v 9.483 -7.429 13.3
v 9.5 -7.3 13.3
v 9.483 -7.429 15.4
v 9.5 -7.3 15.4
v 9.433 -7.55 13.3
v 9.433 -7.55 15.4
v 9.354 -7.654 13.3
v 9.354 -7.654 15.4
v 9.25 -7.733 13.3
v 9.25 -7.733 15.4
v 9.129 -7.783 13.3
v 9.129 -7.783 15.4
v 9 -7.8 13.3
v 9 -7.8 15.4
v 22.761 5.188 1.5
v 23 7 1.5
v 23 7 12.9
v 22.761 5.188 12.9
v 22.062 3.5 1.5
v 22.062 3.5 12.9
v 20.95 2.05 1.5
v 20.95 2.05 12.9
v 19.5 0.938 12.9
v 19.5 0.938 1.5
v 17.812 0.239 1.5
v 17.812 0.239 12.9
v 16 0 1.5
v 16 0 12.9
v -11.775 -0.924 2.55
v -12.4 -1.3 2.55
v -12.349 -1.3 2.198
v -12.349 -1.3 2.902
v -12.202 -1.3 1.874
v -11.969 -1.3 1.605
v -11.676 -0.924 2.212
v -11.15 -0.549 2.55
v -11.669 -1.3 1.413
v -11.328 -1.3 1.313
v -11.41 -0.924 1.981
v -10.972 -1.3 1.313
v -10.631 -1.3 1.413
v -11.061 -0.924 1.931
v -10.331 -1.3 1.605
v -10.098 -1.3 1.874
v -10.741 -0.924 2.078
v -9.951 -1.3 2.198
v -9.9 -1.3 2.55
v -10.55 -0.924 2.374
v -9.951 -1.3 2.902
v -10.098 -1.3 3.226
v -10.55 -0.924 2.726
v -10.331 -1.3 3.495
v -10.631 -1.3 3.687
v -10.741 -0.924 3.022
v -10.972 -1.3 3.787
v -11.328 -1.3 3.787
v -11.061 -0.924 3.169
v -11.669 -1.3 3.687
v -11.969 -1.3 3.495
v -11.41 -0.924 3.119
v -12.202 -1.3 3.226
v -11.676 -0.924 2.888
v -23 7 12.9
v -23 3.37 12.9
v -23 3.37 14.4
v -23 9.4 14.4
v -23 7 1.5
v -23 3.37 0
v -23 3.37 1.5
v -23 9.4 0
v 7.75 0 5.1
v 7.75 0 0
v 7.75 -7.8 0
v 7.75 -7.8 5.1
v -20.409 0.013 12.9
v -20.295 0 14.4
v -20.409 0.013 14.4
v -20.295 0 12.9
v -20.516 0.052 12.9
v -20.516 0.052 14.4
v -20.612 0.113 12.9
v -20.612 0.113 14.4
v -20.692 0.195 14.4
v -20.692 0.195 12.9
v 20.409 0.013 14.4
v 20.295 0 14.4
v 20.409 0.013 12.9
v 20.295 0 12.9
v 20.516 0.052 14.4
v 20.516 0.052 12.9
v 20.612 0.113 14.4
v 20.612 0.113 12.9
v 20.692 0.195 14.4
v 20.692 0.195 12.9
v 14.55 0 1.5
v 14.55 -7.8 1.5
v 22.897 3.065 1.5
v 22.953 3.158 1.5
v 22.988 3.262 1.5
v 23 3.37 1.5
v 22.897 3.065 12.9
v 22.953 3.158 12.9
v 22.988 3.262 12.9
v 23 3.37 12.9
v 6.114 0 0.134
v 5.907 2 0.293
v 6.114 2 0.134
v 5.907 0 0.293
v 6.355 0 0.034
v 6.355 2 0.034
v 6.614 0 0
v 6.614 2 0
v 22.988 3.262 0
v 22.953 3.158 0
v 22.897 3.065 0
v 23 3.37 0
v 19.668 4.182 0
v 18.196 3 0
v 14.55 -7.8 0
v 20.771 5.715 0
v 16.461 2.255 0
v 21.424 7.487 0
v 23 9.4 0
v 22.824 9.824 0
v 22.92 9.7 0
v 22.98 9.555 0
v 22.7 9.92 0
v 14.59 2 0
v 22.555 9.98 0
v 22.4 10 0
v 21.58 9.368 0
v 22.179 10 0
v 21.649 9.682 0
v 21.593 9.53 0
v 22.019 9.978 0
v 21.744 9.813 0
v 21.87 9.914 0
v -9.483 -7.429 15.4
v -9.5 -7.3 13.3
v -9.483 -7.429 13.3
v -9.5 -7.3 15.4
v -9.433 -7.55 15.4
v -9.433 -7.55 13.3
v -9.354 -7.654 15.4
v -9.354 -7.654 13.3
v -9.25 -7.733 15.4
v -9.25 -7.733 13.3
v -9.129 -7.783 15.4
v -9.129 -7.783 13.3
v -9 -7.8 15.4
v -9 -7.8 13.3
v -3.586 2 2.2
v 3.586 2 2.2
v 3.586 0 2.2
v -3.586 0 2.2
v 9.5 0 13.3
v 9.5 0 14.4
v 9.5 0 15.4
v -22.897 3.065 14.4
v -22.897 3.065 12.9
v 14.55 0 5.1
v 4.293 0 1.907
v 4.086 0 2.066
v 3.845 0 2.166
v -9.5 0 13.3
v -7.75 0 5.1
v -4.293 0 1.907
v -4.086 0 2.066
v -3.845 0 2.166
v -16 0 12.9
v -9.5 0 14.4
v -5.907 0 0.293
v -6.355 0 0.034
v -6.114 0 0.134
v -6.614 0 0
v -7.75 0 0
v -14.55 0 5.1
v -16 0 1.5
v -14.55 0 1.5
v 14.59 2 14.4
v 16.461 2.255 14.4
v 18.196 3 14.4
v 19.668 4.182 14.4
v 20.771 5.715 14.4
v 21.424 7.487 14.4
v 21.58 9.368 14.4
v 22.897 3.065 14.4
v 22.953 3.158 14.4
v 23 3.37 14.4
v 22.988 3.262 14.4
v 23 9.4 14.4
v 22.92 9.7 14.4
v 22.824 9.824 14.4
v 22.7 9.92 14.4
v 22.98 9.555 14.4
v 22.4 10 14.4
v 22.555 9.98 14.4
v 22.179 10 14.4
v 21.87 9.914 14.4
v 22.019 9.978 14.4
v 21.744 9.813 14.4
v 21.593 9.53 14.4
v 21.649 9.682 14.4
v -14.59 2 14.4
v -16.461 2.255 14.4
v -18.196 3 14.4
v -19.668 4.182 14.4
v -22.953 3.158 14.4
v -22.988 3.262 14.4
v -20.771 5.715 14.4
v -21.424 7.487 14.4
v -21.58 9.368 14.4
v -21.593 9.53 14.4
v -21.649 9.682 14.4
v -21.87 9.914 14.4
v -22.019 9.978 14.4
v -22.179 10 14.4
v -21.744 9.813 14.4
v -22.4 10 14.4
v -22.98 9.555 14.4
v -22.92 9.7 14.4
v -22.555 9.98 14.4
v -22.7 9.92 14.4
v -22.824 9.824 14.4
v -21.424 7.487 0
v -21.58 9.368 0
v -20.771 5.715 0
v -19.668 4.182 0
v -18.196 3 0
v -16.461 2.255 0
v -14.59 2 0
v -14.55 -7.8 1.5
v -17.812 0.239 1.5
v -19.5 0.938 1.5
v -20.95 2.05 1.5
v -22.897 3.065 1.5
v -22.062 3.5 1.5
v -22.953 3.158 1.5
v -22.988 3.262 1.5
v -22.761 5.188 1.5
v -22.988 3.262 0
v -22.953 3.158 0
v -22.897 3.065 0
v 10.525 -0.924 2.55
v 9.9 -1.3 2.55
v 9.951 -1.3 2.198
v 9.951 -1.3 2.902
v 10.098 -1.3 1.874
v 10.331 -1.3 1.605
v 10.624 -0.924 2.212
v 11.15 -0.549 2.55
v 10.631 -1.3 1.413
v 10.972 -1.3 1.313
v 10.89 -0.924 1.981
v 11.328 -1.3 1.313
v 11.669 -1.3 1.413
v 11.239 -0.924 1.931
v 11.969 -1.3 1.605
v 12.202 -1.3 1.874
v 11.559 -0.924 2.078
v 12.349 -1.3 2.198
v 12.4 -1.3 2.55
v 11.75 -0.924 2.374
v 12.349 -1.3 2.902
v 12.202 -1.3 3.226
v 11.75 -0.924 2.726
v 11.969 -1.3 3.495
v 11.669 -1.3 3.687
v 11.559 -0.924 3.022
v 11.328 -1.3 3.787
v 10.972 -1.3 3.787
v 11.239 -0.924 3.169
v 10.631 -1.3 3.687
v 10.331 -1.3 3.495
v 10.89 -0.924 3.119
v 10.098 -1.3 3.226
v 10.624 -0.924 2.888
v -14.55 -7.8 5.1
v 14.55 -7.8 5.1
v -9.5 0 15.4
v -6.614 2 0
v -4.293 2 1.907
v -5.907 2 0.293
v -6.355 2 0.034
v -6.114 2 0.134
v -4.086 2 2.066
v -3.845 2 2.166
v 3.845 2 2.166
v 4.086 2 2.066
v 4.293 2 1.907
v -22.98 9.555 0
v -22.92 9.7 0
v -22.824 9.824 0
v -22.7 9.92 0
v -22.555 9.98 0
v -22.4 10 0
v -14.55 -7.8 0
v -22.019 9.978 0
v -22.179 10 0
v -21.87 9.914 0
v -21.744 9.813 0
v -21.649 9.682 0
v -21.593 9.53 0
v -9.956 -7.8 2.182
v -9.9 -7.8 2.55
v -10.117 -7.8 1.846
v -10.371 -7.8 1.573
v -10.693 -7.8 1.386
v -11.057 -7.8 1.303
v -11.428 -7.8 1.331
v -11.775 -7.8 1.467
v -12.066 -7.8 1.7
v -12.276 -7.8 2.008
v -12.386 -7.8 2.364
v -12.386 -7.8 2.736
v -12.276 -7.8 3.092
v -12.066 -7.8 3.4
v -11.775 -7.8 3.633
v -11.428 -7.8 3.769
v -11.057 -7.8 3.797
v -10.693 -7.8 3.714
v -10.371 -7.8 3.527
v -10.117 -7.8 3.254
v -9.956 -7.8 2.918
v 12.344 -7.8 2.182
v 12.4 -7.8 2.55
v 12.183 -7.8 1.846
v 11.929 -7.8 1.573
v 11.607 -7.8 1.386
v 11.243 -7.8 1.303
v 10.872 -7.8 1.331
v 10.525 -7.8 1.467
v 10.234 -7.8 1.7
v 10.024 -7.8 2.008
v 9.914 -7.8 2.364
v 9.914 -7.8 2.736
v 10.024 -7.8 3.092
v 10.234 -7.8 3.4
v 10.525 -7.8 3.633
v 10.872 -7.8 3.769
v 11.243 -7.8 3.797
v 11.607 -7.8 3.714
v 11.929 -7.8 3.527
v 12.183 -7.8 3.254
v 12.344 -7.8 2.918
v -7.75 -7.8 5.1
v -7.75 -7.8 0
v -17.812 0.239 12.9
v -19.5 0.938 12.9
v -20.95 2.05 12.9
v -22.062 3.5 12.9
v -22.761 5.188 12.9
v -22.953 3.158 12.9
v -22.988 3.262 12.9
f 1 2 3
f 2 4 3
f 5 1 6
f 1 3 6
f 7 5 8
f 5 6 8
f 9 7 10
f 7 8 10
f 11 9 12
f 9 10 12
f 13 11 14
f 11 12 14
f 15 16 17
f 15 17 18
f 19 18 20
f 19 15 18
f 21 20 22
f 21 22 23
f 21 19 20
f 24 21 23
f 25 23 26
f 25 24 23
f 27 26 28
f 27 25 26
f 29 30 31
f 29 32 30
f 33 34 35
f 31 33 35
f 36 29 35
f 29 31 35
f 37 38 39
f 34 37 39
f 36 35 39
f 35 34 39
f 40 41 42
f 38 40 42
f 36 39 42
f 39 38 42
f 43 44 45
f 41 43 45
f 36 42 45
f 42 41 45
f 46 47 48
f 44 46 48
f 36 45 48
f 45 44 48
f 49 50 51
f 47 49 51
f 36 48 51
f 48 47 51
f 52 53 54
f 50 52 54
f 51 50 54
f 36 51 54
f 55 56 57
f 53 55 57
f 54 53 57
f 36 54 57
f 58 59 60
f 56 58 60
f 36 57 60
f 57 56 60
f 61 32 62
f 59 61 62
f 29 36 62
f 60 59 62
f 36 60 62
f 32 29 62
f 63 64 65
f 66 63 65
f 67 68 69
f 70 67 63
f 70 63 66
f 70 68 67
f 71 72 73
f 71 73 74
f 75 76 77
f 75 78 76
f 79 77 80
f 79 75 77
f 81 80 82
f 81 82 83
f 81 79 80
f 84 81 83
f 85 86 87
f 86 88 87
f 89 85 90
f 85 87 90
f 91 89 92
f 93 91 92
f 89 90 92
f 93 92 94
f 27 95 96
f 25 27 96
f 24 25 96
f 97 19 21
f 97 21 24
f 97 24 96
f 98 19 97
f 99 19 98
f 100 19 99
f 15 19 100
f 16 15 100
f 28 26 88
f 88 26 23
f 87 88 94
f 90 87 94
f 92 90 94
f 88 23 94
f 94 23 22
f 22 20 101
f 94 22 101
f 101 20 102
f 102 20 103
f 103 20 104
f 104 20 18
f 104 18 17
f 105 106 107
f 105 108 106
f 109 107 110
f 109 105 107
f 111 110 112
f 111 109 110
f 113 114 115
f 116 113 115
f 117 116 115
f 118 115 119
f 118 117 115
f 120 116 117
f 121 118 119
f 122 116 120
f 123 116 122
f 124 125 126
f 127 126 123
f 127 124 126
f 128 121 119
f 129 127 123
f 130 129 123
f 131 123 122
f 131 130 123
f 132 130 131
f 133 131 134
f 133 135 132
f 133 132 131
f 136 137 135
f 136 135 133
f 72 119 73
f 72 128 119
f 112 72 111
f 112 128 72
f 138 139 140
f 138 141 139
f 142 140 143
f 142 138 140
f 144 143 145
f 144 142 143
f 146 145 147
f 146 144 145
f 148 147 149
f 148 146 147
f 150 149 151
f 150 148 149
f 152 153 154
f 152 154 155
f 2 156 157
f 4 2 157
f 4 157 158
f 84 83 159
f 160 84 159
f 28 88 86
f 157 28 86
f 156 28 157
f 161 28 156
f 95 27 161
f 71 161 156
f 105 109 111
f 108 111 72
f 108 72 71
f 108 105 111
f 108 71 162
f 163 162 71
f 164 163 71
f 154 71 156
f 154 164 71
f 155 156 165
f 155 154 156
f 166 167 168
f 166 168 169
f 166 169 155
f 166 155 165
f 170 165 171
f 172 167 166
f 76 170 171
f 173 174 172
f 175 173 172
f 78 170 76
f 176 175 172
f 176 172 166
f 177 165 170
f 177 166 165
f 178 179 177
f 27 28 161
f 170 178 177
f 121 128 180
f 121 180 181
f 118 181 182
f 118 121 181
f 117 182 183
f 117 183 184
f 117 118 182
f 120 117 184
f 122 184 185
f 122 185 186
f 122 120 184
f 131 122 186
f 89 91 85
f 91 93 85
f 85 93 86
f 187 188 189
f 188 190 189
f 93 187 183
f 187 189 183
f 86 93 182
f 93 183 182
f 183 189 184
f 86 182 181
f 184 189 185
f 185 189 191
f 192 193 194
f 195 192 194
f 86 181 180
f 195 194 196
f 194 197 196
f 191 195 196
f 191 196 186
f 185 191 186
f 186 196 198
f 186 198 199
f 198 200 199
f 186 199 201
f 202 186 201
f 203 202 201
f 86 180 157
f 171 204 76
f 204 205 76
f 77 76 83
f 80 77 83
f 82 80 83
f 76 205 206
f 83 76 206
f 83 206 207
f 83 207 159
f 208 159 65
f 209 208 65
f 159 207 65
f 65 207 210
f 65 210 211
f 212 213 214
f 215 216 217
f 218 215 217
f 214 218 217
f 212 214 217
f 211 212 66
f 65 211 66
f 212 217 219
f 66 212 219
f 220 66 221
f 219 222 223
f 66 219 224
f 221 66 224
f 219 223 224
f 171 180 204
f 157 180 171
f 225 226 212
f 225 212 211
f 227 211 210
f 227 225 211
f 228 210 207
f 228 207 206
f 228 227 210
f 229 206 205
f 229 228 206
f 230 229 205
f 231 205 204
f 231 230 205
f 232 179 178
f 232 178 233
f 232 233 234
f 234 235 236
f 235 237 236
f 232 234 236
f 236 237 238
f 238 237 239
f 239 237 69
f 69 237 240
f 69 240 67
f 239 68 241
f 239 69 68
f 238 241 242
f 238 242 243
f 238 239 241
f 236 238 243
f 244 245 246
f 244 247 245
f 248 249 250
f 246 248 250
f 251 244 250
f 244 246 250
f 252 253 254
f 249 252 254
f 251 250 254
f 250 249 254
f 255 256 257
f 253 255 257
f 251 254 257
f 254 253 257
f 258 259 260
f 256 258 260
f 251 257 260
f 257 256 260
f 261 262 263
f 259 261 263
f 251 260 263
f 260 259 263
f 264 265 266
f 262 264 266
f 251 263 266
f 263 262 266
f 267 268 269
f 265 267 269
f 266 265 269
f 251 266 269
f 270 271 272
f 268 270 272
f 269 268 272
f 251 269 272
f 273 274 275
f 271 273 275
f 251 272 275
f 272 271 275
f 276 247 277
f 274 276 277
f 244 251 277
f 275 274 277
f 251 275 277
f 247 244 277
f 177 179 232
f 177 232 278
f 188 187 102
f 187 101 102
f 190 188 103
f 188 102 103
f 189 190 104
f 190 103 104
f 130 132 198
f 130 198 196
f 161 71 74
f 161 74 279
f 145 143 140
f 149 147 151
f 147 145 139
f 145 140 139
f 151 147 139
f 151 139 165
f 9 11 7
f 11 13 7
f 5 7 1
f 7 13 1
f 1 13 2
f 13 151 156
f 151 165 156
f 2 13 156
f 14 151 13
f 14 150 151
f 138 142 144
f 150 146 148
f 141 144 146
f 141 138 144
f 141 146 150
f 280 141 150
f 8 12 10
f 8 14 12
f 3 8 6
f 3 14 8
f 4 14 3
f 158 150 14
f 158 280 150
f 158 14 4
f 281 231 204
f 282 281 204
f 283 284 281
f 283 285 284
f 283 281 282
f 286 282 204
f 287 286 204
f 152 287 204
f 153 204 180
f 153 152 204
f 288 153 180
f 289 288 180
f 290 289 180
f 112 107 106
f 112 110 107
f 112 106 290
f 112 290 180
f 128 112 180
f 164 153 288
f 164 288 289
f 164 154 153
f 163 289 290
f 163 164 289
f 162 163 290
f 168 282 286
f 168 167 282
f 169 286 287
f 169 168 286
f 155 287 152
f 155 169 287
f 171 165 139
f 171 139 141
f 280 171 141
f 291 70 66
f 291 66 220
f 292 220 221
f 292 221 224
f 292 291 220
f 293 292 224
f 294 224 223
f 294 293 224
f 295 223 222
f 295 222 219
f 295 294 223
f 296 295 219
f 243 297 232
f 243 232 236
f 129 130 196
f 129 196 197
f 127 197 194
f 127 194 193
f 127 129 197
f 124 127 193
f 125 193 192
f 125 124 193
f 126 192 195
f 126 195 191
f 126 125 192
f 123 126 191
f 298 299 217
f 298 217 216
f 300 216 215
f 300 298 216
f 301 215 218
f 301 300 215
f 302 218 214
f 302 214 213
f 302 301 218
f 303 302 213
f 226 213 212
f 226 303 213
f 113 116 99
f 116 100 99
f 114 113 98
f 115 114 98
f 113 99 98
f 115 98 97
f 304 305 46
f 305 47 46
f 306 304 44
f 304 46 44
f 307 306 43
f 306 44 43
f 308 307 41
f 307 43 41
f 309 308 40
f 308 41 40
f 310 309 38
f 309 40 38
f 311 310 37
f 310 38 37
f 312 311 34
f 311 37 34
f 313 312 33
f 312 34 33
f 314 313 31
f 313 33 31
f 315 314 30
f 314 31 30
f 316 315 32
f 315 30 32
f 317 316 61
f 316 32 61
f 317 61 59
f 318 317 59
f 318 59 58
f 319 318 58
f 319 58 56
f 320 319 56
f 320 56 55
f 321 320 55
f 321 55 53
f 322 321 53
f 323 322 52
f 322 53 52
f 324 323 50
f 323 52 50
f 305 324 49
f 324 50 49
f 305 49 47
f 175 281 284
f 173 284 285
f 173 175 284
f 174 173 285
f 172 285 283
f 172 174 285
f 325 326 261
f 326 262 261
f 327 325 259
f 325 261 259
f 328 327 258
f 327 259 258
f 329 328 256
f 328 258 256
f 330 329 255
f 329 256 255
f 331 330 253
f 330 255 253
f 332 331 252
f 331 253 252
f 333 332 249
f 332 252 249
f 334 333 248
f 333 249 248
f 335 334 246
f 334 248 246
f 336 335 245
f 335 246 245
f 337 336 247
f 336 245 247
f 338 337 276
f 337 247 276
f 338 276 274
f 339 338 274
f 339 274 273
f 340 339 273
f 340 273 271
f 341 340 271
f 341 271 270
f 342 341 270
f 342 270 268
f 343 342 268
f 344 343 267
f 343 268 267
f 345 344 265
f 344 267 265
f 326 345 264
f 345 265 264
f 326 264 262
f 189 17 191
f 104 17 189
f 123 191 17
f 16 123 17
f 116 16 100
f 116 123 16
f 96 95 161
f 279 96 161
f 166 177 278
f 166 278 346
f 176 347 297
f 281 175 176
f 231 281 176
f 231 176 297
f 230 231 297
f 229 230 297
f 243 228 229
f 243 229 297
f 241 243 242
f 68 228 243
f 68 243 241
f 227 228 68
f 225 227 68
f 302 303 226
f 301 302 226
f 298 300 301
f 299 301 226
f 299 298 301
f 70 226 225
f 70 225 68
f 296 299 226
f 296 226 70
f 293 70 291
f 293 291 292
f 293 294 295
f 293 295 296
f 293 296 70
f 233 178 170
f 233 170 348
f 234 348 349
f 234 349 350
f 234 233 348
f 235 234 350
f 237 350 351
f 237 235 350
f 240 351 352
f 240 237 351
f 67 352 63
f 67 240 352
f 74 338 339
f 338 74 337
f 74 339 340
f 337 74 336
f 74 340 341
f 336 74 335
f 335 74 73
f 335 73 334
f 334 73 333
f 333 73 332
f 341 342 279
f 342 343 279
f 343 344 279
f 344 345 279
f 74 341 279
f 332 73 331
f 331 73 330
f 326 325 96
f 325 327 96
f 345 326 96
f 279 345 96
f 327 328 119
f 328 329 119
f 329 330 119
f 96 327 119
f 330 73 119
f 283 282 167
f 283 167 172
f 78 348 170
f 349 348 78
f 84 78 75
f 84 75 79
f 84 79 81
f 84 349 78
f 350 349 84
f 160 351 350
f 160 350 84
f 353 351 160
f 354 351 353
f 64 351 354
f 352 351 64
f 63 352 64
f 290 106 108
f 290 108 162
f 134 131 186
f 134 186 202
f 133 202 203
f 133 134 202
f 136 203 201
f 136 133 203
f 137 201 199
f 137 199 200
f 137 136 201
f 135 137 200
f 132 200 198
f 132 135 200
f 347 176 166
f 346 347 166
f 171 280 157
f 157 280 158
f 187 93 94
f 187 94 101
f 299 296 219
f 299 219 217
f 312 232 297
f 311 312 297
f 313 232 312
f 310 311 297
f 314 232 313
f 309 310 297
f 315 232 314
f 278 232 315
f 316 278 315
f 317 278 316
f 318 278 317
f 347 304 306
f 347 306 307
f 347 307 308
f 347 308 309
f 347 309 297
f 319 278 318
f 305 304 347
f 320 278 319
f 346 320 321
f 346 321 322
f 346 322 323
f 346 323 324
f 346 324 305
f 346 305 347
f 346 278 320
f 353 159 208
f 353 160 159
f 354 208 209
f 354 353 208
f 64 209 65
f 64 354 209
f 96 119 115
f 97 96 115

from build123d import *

# Parameters (mm, degrees)
EXTRUDE_1_DEPTH        = 14.4
CUT_EXTRUDE_1_REACH    = 4
EXTRUDE_2_DEPTH        = 1.5
SKETCH_4_W             = 6.8
SKETCH_4_H             = 3.6
EXTRUDE_3_DEPTH        = 7.8
SKETCH_5_W             = 19
SKETCH_5_H             = 2.1
EXTRUDE_4_DEPTH        = 7.8
EXTRUDE_5_DEPTH        = 1.5
HOLE_WIZARD_M3_1_D     = 2.5
HOLE_WIZARD_M3_1_DEPTH = 6.5
HOLE_WIZARD_M3_1_TIP   = 0.751075774
FILLET_1_R             = 0.5
FILLET_2_R             = 1


with BuildPart() as part:
    # 草图1 → 凸台-拉伸1 (new body)
    with BuildSketch(Plane.XY):
        with BuildLine():
            Line((16, 0), (-16, 0))
            ThreePointArc((-16, 0), (-20.949747468, 2.050252532), (-23, 7))
            Line((-23, 7), (-23, 9.4))
            ThreePointArc((-23, 9.4), (-22.824264069, 9.824264069), (-22.4, 10))
            Line((-22.4, 10), (-22.179247695, 10))
            ThreePointArc((-22.179247695, 10), (-21.743961945, 9.812948321), (-21.580079296, 9.368421053))
            ThreePointArc((-21.580079296, 9.368421053), (-19.668115061, 4.182269589), (-14.58978131, 2))
            Line((-14.58978131, 2), (14.58978131, 2))
            ThreePointArc((14.58978131, 2), (19.668115061, 4.182269589), (21.580079296, 9.368421053))
            ThreePointArc((21.580079296, 9.368421053), (21.743961945, 9.812948321), (22.179247695, 10))
            Line((22.179247695, 10), (22.4, 10))
            ThreePointArc((22.4, 10), (22.824264069, 9.824264069), (23, 9.4))
            Line((23, 9.4), (23, 7))
            ThreePointArc((23, 7), (20.949747468, 2.050252532), (16, 0))
        make_face()
    extrude(amount=EXTRUDE_1_DEPTH)

    # 草图2 → 切除-拉伸1 (cut, up to next)
    with BuildSketch(Plane(origin=(0, 2, 0), x_dir=(1, 0, 0), z_dir=(0, 1, 0)), mode=Mode.PRIVATE) as cut_extrude_1_sk1:
        Polygon((4, -2.2), (-4, -2.2), (-6.2, 0), (6.2, 0), align=None)
    cut_extrude_1_tool1 = extrude(cut_extrude_1_sk1.sketch, amount=-CUT_EXTRUDE_1_REACH, mode=Mode.PRIVATE) & part.part
    add(cut_extrude_1_tool1.solids().sort_by_distance((0, 2, 1.020915))[0], mode=Mode.SUBTRACT)

    # 草图3 → 凸台-拉伸2 (add)
    with BuildSketch(Plane.XY):
        Polygon((-7.75, 2), (-7.75, -7.8), (-14.55, -7.8), (-23, 3.2), (-23, 8.2), (-22.047090089, 8.2), (-19.556592195, 2.646086111), (-16.835492645, 2), align=None)
        Polygon((16.835492645, 2), (7.75, 2), (7.75, -7.8), (14.55, -7.8), (23, 3.2), (23, 8.2), (22.047090089, 8.2), (19.556592195, 2.646086111), align=None)
    extrude(amount=EXTRUDE_2_DEPTH)

    # 草图4 → 凸台-拉伸3 (add)
    with BuildSketch(Plane.XZ):
        with Locations((-11.15, 3.3)):
            Rectangle(SKETCH_4_W, SKETCH_4_H)
        with Locations((11.15, 3.3)):
            Rectangle(SKETCH_4_W, SKETCH_4_H)
    extrude(amount=EXTRUDE_3_DEPTH)

    # 草图5 → 凸台-拉伸4 (add)
    with BuildSketch(Plane.XZ):
        with Locations((0, 14.35)):
            Rectangle(SKETCH_5_W, SKETCH_5_H)
    extrude(amount=EXTRUDE_4_DEPTH)

    # 草图6 → 凸台-拉伸5 (add)
    with BuildSketch(Plane.XY.offset(14.4)):
        Polygon((-7.75, 0), (-20.541818182, 0), (-23, 3.2), (-23, 8.2), (-22.047090089, 8.2), (-19.556592195, 2.646086111), (-16.835492645, 2), (-7.75, 2), align=None)
        Polygon((7.75, 0), (20.541818182, 0), (23, 3.2), (23, 8.2), (22.047090089, 8.2), (19.556592195, 2.646086111), (16.835492645, 2), (7.75, 2), align=None)
    extrude(amount=-EXTRUDE_5_DEPTH)

    # M3 螺纹孔1
    with Locations(Plane(origin=(0, -7.8, 0), x_dir=(-1, 0, 0), z_dir=(0, -1, 0))):
        with Locations((-11.15, -2.55), (11.15, -2.55)):
            Hole(HOLE_WIZARD_M3_1_D / 2, depth=HOLE_WIZARD_M3_1_DEPTH)
            with Locations((0, 0, -(HOLE_WIZARD_M3_1_DEPTH + HOLE_WIZARD_M3_1_TIP / 2))):  # 118° drill point
                Cone(0, HOLE_WIZARD_M3_1_D / 2, HOLE_WIZARD_M3_1_TIP, mode=Mode.SUBTRACT)

    # 圆角1
    fillet_1_edges = [part.edges().sort_by_distance(p)[0] for p in [
        (9.5, -7.8, 14.35),
        (-9.5, -7.8, 14.35),
        (-20.541818182, 0, 13.65),
        (-23, 3.2, 13.65),
        (20.541818182, 0, 13.65),
        (23, 3.2, 13.65),
        (-23, 3.2, 0.75),
        (23, 3.2, 0.75),
    ]]
    fillet(fillet_1_edges, radius=FILLET_1_R)

    # 圆角2
    fillet_2_edges = [part.edges().sort_by_distance(p)[0] for p in [
        (-6.2, 1, 0),
        (6.2, 1, 0),
        (4, 1, 2.2),
        (-4, 1, 2.2),
    ]]
    fillet(fillet_2_edges, radius=FILLET_2_R)


solid = part.part
